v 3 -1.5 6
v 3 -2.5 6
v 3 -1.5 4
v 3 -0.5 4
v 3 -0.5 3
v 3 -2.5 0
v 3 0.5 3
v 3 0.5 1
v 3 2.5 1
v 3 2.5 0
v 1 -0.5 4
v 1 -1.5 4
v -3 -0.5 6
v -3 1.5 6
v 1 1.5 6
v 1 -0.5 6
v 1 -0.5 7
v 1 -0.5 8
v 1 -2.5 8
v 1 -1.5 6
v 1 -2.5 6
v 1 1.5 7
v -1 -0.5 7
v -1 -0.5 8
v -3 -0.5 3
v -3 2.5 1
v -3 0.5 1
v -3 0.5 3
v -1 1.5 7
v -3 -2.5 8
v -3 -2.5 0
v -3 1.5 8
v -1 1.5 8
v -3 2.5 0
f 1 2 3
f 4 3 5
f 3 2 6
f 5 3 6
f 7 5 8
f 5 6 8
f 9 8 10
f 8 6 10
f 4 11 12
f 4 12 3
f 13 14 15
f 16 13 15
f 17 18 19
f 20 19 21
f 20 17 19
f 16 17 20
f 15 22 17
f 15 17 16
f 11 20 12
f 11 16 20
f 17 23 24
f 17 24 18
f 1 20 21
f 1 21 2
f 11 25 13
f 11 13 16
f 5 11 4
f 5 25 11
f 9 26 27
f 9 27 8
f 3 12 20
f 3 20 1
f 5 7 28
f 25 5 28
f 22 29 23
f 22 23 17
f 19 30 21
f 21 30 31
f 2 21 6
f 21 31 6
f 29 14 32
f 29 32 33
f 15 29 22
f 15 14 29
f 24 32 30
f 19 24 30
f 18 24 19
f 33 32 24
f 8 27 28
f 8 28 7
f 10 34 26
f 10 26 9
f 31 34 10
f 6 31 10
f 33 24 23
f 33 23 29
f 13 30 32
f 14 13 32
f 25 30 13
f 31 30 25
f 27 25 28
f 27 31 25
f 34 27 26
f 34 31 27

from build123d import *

# Parameters (mm, degrees)
SKETCH1_W           = 6
SKETCH1_H           = 5
BOSS_EXTRUDE1_DEPTH = 8
SKETCH3_W           = 2
SKETCH3_H           = 5
CUT_EXTRUDE1_DEPTH  = 2
SKETCH4_W           = 2
SKETCH4_H           = 2
CUT_EXTRUDE2_DEPTH  = 1
SKETCH5_W           = 6
SKETCH5_H           = 5
CUT_EXTRUDE3_DEPTH  = 2
SKETCH6_W           = 2
SKETCH6_H           = 2
CUT_EXTRUDE4_DEPTH  = 2
CUT_EXTRUDE5_DEPTH  = 1
SKETCH8_W           = 8.535402973
SKETCH8_H           = 3.487061374
CUT_EXTRUDE6_DEPTH  = 1
SKETCH9_W           = 2
SKETCH9_H           = 1
CUT_EXTRUDE7_DEPTH  = 1


with BuildPart() as part:
    # Sketch1 → Boss-Extrude1 (new body)
    with BuildSketch(Plane.XY):
        Rectangle(SKETCH1_W, SKETCH1_H)
    extrude(amount=BOSS_EXTRUDE1_DEPTH)

    # Sketch3 → Cut-Extrude1 (cut)
    with BuildSketch(Plane.XY.offset(8)):
        with Locations((2, 0)):
            Rectangle(SKETCH3_W, SKETCH3_H)
    extrude(amount=-CUT_EXTRUDE1_DEPTH, mode=Mode.SUBTRACT)

    # Sketch4 → Cut-Extrude2 (cut)
    with BuildSketch(Plane.XY.offset(8)):
        with Locations((0, 1.5)):
            Rectangle(SKETCH4_W, SKETCH4_H)
    extrude(amount=-CUT_EXTRUDE2_DEPTH, mode=Mode.SUBTRACT)

    # Sketch5 → Cut-Extrude3 (cut)
    with BuildSketch(Plane(origin=(0, 2.5, 0), x_dir=(1, 0, 0), z_dir=(0, 1, 0))):
        with Locations((0, -3.5)):
            Rectangle(SKETCH5_W, SKETCH5_H)
    extrude(amount=-CUT_EXTRUDE3_DEPTH, mode=Mode.SUBTRACT)

    # Sketch6 → Cut-Extrude4 (cut)
    with BuildSketch(Plane(origin=(0, 0.5, 0), x_dir=(1, 0, 0), z_dir=(0, 1, 0))):
        with Locations((2, -5)):
            Rectangle(SKETCH6_W, SKETCH6_H)
    extrude(amount=-CUT_EXTRUDE4_DEPTH, mode=Mode.SUBTRACT)

    # Sketch7 → Cut-Extrude5 (cut)
    with BuildSketch(Plane(origin=(0, 0.5, 0), x_dir=(1, 0, 0), z_dir=(0, 1, 0))):
        Polygon((3, -4), (3, -3), (-3, -3), (-3, -6), (1, -6), (1, -4), align=None)
    extrude(amount=-CUT_EXTRUDE5_DEPTH, mode=Mode.SUBTRACT)

    # Sketch8 → Cut-Extrude6 (cut)
    with BuildSketch(Plane(origin=(0, 2.5, 0), x_dir=(1, 0, 0), z_dir=(0, 1, 0))):
        with Locations((-0.885821847, -7.448525998)):
            Rectangle(SKETCH8_W, SKETCH8_H)
    extrude(amount=-CUT_EXTRUDE6_DEPTH, mode=Mode.SUBTRACT)

    # Sketch9 → Cut-Extrude7 (cut)
    with BuildSketch(Plane(origin=(0, 0.5, 0), x_dir=(1, 0, 0), z_dir=(0, 1, 0))):
        with Locations((0, -7.5)):
            Rectangle(SKETCH9_W, SKETCH9_H)
    extrude(amount=-CUT_EXTRUDE7_DEPTH, mode=Mode.SUBTRACT)


solid = part.part
